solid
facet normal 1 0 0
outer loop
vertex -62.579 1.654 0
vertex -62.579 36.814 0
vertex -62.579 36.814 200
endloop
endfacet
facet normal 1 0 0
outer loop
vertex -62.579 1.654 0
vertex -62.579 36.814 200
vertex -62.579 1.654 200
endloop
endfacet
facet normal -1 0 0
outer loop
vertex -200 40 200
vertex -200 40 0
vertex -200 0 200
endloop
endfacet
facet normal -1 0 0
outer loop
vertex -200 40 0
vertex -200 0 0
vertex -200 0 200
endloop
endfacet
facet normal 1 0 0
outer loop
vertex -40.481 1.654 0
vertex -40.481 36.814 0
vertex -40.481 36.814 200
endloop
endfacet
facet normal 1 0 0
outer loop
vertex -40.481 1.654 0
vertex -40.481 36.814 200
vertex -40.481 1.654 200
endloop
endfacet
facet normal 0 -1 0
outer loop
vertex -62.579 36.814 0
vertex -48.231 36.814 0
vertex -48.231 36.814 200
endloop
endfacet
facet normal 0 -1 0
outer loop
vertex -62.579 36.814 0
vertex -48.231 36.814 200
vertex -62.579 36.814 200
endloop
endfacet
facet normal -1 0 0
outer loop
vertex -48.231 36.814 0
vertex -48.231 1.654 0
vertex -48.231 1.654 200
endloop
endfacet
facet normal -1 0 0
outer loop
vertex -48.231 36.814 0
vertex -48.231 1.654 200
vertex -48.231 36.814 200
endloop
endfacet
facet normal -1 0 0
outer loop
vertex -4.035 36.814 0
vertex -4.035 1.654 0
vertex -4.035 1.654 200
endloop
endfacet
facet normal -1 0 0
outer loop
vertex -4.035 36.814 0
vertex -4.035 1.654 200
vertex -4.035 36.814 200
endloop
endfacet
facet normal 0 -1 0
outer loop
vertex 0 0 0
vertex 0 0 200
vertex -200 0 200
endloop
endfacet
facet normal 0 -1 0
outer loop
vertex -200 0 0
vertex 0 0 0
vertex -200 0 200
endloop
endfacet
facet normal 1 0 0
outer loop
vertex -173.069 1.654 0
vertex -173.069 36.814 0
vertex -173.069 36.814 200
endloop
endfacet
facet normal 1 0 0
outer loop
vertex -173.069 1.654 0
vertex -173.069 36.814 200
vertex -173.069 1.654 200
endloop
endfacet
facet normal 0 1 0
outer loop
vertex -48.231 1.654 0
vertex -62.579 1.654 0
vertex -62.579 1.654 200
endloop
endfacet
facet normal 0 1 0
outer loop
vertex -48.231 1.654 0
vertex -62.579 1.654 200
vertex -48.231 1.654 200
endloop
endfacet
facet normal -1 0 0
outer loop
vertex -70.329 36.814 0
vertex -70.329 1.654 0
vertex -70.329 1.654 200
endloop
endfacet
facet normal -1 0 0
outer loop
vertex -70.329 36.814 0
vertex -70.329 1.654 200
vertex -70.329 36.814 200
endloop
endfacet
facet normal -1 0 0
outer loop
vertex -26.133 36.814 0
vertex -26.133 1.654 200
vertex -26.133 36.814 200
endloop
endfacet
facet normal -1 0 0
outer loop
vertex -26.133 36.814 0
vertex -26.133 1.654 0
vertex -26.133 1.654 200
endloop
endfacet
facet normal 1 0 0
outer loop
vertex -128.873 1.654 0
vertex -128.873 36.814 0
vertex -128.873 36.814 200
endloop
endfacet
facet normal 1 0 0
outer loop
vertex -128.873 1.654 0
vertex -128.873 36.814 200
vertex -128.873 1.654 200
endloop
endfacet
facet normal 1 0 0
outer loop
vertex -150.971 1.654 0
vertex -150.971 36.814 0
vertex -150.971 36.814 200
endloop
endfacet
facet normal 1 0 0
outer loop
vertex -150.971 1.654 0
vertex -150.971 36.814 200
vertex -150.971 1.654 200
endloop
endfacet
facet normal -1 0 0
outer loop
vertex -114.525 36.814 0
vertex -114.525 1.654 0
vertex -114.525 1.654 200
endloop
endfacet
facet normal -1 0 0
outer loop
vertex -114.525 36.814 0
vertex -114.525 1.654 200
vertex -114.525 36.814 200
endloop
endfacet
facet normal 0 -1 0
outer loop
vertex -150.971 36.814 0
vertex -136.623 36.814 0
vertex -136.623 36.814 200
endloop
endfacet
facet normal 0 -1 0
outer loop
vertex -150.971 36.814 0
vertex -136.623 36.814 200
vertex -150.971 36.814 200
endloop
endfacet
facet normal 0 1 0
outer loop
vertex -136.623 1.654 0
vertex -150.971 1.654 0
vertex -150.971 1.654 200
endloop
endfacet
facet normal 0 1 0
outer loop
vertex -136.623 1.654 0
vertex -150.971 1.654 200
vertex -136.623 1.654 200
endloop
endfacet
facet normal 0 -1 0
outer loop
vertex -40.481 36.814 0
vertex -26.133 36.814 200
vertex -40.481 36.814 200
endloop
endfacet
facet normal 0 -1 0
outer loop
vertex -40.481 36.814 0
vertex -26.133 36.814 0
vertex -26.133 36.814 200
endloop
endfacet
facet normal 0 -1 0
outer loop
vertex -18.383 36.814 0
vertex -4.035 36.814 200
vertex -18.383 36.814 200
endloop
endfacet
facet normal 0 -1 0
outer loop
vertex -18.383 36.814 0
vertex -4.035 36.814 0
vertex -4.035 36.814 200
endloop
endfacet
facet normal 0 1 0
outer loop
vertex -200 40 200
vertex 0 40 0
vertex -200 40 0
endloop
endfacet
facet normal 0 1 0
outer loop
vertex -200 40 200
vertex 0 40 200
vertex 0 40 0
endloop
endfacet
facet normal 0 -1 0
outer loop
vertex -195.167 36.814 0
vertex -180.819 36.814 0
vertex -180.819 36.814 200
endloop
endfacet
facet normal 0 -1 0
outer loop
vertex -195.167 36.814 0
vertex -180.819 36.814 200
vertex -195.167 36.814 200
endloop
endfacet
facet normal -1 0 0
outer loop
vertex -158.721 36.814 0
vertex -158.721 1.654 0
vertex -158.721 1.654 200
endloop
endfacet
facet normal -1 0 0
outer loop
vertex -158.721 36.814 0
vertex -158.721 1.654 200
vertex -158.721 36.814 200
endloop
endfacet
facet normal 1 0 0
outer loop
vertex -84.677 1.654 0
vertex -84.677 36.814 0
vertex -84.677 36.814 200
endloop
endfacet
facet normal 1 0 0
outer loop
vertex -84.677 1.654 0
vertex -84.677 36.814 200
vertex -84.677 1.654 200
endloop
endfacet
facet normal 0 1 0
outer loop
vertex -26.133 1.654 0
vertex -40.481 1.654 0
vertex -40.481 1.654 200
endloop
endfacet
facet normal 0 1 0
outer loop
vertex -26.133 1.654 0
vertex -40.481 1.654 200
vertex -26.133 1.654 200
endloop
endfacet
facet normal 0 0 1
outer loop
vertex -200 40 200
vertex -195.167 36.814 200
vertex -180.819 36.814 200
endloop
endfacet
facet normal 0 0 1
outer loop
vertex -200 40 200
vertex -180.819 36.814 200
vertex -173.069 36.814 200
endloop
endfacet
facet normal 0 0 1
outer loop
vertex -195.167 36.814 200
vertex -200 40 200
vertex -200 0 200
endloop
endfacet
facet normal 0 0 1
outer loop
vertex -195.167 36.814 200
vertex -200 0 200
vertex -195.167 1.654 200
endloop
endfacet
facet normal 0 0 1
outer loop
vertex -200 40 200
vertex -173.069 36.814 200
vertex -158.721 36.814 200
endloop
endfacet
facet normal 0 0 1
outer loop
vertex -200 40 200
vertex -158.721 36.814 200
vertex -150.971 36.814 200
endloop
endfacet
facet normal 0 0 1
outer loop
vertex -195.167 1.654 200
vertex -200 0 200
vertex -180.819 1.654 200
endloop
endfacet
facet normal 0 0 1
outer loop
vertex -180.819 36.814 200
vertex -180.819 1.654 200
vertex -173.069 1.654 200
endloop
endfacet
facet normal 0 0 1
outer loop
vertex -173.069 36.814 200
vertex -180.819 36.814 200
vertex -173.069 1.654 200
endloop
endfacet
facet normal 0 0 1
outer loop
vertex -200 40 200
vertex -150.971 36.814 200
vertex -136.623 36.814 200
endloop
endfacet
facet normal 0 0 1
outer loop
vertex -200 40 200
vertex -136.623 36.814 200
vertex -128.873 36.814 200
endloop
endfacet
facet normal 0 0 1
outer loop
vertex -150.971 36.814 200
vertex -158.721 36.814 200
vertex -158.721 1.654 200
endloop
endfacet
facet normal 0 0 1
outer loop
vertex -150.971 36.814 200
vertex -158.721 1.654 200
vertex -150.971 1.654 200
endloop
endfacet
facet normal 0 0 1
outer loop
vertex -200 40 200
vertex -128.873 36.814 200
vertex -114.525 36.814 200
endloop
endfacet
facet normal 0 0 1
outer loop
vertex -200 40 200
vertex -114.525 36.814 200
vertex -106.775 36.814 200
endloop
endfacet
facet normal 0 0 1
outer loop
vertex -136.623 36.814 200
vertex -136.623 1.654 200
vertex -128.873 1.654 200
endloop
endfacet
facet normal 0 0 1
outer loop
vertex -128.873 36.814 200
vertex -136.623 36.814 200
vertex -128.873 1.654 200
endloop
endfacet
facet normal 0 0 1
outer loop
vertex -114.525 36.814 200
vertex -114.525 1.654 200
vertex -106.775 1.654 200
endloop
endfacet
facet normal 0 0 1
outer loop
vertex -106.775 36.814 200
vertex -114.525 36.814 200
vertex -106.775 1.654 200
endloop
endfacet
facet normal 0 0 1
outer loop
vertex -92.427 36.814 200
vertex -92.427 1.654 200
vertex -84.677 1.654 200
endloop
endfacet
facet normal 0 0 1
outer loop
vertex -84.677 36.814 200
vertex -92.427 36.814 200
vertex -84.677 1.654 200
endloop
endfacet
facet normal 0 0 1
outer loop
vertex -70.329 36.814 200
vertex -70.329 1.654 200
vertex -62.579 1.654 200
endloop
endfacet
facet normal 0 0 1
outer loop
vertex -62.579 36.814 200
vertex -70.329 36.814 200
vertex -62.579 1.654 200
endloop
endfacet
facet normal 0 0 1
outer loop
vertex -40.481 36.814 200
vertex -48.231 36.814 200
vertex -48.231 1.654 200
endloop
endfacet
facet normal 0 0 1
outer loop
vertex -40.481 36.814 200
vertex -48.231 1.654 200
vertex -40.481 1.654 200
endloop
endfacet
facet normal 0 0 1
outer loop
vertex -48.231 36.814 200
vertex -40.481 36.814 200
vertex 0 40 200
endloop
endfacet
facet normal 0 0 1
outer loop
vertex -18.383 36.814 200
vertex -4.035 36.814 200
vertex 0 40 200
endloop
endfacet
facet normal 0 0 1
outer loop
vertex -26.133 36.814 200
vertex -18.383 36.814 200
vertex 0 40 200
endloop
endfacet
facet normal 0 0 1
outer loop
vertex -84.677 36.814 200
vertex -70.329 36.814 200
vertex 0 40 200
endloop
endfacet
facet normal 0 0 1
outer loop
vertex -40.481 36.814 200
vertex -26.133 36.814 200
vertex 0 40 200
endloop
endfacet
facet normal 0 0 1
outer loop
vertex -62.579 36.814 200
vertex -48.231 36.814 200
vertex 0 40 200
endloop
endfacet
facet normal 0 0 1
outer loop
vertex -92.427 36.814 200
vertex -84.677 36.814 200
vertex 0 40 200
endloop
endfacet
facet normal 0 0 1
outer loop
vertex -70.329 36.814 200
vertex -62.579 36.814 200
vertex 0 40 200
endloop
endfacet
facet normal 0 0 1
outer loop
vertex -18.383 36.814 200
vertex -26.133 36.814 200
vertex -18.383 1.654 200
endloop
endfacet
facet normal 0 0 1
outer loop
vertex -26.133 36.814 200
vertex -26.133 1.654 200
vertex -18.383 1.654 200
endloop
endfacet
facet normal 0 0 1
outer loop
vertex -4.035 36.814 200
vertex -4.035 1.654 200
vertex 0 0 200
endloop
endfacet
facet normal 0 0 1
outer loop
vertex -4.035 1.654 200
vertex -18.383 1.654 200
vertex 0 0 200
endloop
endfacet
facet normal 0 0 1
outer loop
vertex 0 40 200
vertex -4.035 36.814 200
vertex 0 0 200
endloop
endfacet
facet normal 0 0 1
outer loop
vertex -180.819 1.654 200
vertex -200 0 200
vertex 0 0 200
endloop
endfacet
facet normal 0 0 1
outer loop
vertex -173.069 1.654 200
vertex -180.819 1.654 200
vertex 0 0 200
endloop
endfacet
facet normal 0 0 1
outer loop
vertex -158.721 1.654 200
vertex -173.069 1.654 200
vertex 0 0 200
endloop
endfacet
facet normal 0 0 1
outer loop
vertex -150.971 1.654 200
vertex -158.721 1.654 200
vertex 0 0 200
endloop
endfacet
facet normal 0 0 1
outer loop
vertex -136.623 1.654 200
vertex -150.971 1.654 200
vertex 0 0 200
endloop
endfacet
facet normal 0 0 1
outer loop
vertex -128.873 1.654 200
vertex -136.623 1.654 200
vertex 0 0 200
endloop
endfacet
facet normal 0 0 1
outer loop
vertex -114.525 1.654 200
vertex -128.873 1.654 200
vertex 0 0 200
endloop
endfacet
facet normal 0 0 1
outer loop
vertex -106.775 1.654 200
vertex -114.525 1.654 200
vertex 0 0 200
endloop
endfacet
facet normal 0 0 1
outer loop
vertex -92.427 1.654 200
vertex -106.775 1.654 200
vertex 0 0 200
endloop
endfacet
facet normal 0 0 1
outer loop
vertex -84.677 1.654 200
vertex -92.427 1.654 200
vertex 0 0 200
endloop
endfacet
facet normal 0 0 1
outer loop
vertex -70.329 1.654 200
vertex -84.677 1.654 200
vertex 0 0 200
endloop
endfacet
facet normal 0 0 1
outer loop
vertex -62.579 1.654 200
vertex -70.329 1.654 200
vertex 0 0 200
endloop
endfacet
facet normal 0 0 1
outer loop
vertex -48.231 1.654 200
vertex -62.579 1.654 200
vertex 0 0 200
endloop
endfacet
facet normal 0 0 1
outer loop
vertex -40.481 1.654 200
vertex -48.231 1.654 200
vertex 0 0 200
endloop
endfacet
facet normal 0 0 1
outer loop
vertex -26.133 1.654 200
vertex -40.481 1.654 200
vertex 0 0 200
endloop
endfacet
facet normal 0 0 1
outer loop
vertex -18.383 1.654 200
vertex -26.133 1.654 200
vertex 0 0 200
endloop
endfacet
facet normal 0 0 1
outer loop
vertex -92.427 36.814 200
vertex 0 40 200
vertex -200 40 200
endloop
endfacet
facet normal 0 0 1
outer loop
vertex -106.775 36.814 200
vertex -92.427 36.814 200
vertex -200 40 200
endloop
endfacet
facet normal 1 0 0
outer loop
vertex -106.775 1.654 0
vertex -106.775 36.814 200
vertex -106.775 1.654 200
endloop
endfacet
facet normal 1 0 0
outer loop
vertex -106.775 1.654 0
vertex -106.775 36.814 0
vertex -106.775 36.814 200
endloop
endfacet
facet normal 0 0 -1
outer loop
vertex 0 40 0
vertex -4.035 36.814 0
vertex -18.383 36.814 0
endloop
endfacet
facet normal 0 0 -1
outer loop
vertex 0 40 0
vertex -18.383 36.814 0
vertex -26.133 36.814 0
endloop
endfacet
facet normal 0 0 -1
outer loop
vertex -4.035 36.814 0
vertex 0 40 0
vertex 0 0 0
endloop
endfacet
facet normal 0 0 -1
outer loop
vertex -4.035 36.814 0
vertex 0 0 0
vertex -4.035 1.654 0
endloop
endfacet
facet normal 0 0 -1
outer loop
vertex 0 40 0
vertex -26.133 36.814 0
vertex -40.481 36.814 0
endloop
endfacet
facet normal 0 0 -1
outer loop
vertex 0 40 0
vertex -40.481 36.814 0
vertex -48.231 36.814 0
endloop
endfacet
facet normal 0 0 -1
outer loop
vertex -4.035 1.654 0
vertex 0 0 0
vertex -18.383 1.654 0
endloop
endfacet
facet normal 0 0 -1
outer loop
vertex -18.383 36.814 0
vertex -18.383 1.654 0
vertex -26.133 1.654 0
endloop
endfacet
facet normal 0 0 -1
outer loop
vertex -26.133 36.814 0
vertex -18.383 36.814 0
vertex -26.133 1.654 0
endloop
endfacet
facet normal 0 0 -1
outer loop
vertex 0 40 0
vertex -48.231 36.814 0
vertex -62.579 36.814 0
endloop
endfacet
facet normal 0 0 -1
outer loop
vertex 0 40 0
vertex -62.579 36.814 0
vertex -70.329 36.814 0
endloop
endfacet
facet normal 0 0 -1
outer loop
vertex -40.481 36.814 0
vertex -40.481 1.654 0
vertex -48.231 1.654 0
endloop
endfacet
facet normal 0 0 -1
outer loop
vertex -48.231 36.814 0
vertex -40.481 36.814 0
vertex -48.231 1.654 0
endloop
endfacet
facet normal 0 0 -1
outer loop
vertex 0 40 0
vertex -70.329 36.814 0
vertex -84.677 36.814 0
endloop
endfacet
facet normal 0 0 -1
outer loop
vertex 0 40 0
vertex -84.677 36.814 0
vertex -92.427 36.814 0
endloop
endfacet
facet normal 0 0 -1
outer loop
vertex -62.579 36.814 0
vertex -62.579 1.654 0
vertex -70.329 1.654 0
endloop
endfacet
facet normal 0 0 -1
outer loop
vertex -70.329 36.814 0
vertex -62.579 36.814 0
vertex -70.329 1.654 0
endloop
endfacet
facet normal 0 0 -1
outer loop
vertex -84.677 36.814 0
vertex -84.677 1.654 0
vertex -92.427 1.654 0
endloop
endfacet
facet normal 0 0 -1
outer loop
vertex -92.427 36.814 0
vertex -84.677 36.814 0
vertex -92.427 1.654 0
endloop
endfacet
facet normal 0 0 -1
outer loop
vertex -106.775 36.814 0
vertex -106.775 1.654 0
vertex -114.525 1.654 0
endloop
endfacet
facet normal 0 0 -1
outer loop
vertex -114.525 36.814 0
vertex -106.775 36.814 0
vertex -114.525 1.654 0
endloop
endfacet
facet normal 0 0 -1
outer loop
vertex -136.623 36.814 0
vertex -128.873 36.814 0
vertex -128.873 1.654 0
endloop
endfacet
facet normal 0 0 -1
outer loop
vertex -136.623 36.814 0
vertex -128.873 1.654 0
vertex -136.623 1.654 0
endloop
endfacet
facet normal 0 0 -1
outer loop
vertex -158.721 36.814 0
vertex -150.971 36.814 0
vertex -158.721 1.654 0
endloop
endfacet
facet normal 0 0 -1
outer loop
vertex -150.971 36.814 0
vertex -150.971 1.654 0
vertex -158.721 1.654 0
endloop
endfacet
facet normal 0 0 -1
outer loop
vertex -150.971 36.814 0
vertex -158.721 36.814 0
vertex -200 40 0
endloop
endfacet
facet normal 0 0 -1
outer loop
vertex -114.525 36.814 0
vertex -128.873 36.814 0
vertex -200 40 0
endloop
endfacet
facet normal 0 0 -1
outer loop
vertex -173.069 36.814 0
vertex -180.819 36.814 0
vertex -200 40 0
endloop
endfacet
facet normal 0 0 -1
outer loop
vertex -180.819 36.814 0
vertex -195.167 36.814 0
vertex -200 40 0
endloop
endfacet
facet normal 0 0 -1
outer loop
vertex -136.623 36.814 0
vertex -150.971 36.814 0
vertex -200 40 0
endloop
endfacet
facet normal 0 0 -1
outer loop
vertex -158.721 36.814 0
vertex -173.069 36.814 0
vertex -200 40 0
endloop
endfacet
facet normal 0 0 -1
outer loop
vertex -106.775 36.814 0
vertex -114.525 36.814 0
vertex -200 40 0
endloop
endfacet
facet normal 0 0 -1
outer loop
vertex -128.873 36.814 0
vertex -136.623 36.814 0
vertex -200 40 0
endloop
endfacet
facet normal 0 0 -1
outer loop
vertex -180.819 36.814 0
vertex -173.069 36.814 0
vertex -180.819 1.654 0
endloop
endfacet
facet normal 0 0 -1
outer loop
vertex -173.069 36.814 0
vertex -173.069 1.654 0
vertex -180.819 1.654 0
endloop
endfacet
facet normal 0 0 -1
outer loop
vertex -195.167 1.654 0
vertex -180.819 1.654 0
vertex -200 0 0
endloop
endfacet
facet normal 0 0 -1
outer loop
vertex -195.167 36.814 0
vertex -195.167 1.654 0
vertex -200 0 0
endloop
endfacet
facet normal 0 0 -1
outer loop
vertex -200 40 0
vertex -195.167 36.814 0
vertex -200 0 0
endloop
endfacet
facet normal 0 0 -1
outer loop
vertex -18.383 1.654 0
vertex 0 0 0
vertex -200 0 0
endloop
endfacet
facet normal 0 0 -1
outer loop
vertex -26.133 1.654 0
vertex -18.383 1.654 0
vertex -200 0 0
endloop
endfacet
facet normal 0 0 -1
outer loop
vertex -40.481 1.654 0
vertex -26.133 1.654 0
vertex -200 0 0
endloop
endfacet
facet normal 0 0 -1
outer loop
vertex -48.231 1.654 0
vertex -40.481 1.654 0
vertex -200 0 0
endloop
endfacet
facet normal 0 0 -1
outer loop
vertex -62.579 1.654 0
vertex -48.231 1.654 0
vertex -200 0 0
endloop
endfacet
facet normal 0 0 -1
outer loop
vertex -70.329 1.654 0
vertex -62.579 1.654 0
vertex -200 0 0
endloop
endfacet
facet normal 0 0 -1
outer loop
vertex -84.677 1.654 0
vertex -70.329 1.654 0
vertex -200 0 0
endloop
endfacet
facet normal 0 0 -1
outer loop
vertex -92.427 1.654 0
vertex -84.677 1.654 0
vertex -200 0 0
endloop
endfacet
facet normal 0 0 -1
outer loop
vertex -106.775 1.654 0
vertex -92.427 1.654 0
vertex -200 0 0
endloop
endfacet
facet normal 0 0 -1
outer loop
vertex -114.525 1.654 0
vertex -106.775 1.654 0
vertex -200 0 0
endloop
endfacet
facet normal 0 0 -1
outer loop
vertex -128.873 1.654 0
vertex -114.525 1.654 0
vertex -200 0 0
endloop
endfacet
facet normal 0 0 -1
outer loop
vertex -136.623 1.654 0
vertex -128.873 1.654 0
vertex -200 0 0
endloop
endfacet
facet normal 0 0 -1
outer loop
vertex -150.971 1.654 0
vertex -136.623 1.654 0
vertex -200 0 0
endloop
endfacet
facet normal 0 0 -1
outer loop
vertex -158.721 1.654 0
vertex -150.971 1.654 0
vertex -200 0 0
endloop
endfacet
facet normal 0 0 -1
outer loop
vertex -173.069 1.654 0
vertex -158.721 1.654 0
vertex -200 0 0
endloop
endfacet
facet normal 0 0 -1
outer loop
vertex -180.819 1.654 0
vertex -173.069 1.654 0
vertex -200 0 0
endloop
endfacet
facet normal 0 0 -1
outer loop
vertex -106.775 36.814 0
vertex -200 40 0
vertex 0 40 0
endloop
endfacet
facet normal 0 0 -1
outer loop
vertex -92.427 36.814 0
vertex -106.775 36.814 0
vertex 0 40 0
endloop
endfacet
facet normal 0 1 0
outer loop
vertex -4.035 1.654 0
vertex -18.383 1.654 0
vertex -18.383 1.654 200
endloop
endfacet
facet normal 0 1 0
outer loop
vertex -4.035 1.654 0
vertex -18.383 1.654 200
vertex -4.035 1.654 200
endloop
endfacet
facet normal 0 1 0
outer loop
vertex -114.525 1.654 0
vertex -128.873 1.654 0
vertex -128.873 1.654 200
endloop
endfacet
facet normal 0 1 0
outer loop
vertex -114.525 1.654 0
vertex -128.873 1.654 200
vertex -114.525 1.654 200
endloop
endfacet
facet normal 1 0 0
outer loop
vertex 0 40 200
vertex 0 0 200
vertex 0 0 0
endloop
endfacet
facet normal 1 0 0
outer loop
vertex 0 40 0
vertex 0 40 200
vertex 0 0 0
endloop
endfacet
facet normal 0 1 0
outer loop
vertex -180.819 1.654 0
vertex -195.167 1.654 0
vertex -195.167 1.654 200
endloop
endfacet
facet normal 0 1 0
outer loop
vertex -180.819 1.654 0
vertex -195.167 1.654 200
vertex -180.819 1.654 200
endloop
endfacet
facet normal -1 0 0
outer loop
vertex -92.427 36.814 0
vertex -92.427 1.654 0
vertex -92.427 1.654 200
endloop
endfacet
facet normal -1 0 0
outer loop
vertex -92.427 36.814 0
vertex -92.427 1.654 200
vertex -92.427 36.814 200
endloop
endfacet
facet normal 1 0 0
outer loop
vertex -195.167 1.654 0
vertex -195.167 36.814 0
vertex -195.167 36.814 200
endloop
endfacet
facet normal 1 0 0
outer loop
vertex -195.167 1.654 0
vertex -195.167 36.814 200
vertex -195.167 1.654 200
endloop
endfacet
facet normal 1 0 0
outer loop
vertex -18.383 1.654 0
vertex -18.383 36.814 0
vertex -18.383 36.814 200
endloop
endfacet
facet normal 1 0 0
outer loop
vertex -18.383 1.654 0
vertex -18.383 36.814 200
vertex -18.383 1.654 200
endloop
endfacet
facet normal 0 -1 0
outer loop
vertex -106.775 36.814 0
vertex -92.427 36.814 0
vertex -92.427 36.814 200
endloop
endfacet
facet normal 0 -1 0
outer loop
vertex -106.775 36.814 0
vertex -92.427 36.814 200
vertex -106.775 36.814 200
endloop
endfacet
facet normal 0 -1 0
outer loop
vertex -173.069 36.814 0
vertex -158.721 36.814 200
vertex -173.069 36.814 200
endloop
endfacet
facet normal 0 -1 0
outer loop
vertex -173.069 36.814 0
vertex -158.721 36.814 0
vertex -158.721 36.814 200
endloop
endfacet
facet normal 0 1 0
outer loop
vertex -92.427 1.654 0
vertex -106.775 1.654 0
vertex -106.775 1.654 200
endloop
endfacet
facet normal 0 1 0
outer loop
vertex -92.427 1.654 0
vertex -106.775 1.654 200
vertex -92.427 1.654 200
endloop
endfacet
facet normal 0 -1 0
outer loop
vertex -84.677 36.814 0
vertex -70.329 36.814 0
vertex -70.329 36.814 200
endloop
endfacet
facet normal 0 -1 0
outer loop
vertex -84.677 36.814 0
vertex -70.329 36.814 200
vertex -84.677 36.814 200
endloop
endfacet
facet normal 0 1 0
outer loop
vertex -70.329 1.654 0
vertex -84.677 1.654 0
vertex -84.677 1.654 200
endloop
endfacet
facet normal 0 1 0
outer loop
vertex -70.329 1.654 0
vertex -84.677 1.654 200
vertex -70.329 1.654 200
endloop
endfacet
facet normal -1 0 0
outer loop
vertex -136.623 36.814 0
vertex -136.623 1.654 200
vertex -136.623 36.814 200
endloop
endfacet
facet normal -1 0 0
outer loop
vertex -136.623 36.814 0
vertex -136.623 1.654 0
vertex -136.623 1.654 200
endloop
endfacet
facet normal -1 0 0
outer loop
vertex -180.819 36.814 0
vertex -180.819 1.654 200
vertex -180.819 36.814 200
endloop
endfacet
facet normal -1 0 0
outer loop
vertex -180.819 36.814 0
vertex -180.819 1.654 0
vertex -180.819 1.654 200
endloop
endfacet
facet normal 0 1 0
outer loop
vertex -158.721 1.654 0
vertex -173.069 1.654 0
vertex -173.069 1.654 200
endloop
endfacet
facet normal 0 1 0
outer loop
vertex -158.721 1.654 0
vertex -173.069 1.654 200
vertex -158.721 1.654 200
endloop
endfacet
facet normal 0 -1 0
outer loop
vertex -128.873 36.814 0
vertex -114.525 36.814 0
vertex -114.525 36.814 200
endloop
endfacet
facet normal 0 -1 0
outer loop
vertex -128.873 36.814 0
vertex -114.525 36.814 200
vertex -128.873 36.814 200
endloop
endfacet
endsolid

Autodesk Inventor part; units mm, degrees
ref_plane "YZ Plane" through (0, 0, 0) normal (1, 0, 0) x (0, 1, 0)
ref_plane "XZ Plane" through (0, 0, 0) normal (0, 1, 0) x (-1, 0, 0)
ref_plane "XY Plane" through (0, 0, 0) normal (0, 0, 1) x (1, 0, 0)
sketch "Sketch1" plane through (0, 0, 0) normal (0, 1, 0) x (-1, 0, 0)
  line L0 (0, 0) -> (200, 0)
  line L1 (200, 0) -> (200, 200)
  line L2 (200, 200) -> (0, 200)
  line L3 (0, 200) -> (0, 0)
  dimension "d0" = 200
  dimension "d1" = 200
extrude "Extrusion1" add sketch "Sketch1" along normal blind 40
sketch "Sketch2" plane through (0, 0, 0) normal (0, 0, -1) x (-1, 0, 0)
  line L0 (4.0349, 36.8144) -> (18.3828, 36.8144)
  line L1 (18.3828, 36.8144) -> (18.3828, 1.6542)
  line L2 (18.3828, 1.6542) -> (4.0349, 1.6542)
  line L3 (4.0349, 1.6542) -> (4.0349, 36.8144)
  point P0 (0, 0)
extrude "Extrusion2" cut sketch "Sketch2" against normal blind 310
pattern_linear "Rectangular Pattern1" count 9 spacing 22.098 along (-1, 0, 0) of "Extrusion2"
properties part number "refractory_quarry_tile"
